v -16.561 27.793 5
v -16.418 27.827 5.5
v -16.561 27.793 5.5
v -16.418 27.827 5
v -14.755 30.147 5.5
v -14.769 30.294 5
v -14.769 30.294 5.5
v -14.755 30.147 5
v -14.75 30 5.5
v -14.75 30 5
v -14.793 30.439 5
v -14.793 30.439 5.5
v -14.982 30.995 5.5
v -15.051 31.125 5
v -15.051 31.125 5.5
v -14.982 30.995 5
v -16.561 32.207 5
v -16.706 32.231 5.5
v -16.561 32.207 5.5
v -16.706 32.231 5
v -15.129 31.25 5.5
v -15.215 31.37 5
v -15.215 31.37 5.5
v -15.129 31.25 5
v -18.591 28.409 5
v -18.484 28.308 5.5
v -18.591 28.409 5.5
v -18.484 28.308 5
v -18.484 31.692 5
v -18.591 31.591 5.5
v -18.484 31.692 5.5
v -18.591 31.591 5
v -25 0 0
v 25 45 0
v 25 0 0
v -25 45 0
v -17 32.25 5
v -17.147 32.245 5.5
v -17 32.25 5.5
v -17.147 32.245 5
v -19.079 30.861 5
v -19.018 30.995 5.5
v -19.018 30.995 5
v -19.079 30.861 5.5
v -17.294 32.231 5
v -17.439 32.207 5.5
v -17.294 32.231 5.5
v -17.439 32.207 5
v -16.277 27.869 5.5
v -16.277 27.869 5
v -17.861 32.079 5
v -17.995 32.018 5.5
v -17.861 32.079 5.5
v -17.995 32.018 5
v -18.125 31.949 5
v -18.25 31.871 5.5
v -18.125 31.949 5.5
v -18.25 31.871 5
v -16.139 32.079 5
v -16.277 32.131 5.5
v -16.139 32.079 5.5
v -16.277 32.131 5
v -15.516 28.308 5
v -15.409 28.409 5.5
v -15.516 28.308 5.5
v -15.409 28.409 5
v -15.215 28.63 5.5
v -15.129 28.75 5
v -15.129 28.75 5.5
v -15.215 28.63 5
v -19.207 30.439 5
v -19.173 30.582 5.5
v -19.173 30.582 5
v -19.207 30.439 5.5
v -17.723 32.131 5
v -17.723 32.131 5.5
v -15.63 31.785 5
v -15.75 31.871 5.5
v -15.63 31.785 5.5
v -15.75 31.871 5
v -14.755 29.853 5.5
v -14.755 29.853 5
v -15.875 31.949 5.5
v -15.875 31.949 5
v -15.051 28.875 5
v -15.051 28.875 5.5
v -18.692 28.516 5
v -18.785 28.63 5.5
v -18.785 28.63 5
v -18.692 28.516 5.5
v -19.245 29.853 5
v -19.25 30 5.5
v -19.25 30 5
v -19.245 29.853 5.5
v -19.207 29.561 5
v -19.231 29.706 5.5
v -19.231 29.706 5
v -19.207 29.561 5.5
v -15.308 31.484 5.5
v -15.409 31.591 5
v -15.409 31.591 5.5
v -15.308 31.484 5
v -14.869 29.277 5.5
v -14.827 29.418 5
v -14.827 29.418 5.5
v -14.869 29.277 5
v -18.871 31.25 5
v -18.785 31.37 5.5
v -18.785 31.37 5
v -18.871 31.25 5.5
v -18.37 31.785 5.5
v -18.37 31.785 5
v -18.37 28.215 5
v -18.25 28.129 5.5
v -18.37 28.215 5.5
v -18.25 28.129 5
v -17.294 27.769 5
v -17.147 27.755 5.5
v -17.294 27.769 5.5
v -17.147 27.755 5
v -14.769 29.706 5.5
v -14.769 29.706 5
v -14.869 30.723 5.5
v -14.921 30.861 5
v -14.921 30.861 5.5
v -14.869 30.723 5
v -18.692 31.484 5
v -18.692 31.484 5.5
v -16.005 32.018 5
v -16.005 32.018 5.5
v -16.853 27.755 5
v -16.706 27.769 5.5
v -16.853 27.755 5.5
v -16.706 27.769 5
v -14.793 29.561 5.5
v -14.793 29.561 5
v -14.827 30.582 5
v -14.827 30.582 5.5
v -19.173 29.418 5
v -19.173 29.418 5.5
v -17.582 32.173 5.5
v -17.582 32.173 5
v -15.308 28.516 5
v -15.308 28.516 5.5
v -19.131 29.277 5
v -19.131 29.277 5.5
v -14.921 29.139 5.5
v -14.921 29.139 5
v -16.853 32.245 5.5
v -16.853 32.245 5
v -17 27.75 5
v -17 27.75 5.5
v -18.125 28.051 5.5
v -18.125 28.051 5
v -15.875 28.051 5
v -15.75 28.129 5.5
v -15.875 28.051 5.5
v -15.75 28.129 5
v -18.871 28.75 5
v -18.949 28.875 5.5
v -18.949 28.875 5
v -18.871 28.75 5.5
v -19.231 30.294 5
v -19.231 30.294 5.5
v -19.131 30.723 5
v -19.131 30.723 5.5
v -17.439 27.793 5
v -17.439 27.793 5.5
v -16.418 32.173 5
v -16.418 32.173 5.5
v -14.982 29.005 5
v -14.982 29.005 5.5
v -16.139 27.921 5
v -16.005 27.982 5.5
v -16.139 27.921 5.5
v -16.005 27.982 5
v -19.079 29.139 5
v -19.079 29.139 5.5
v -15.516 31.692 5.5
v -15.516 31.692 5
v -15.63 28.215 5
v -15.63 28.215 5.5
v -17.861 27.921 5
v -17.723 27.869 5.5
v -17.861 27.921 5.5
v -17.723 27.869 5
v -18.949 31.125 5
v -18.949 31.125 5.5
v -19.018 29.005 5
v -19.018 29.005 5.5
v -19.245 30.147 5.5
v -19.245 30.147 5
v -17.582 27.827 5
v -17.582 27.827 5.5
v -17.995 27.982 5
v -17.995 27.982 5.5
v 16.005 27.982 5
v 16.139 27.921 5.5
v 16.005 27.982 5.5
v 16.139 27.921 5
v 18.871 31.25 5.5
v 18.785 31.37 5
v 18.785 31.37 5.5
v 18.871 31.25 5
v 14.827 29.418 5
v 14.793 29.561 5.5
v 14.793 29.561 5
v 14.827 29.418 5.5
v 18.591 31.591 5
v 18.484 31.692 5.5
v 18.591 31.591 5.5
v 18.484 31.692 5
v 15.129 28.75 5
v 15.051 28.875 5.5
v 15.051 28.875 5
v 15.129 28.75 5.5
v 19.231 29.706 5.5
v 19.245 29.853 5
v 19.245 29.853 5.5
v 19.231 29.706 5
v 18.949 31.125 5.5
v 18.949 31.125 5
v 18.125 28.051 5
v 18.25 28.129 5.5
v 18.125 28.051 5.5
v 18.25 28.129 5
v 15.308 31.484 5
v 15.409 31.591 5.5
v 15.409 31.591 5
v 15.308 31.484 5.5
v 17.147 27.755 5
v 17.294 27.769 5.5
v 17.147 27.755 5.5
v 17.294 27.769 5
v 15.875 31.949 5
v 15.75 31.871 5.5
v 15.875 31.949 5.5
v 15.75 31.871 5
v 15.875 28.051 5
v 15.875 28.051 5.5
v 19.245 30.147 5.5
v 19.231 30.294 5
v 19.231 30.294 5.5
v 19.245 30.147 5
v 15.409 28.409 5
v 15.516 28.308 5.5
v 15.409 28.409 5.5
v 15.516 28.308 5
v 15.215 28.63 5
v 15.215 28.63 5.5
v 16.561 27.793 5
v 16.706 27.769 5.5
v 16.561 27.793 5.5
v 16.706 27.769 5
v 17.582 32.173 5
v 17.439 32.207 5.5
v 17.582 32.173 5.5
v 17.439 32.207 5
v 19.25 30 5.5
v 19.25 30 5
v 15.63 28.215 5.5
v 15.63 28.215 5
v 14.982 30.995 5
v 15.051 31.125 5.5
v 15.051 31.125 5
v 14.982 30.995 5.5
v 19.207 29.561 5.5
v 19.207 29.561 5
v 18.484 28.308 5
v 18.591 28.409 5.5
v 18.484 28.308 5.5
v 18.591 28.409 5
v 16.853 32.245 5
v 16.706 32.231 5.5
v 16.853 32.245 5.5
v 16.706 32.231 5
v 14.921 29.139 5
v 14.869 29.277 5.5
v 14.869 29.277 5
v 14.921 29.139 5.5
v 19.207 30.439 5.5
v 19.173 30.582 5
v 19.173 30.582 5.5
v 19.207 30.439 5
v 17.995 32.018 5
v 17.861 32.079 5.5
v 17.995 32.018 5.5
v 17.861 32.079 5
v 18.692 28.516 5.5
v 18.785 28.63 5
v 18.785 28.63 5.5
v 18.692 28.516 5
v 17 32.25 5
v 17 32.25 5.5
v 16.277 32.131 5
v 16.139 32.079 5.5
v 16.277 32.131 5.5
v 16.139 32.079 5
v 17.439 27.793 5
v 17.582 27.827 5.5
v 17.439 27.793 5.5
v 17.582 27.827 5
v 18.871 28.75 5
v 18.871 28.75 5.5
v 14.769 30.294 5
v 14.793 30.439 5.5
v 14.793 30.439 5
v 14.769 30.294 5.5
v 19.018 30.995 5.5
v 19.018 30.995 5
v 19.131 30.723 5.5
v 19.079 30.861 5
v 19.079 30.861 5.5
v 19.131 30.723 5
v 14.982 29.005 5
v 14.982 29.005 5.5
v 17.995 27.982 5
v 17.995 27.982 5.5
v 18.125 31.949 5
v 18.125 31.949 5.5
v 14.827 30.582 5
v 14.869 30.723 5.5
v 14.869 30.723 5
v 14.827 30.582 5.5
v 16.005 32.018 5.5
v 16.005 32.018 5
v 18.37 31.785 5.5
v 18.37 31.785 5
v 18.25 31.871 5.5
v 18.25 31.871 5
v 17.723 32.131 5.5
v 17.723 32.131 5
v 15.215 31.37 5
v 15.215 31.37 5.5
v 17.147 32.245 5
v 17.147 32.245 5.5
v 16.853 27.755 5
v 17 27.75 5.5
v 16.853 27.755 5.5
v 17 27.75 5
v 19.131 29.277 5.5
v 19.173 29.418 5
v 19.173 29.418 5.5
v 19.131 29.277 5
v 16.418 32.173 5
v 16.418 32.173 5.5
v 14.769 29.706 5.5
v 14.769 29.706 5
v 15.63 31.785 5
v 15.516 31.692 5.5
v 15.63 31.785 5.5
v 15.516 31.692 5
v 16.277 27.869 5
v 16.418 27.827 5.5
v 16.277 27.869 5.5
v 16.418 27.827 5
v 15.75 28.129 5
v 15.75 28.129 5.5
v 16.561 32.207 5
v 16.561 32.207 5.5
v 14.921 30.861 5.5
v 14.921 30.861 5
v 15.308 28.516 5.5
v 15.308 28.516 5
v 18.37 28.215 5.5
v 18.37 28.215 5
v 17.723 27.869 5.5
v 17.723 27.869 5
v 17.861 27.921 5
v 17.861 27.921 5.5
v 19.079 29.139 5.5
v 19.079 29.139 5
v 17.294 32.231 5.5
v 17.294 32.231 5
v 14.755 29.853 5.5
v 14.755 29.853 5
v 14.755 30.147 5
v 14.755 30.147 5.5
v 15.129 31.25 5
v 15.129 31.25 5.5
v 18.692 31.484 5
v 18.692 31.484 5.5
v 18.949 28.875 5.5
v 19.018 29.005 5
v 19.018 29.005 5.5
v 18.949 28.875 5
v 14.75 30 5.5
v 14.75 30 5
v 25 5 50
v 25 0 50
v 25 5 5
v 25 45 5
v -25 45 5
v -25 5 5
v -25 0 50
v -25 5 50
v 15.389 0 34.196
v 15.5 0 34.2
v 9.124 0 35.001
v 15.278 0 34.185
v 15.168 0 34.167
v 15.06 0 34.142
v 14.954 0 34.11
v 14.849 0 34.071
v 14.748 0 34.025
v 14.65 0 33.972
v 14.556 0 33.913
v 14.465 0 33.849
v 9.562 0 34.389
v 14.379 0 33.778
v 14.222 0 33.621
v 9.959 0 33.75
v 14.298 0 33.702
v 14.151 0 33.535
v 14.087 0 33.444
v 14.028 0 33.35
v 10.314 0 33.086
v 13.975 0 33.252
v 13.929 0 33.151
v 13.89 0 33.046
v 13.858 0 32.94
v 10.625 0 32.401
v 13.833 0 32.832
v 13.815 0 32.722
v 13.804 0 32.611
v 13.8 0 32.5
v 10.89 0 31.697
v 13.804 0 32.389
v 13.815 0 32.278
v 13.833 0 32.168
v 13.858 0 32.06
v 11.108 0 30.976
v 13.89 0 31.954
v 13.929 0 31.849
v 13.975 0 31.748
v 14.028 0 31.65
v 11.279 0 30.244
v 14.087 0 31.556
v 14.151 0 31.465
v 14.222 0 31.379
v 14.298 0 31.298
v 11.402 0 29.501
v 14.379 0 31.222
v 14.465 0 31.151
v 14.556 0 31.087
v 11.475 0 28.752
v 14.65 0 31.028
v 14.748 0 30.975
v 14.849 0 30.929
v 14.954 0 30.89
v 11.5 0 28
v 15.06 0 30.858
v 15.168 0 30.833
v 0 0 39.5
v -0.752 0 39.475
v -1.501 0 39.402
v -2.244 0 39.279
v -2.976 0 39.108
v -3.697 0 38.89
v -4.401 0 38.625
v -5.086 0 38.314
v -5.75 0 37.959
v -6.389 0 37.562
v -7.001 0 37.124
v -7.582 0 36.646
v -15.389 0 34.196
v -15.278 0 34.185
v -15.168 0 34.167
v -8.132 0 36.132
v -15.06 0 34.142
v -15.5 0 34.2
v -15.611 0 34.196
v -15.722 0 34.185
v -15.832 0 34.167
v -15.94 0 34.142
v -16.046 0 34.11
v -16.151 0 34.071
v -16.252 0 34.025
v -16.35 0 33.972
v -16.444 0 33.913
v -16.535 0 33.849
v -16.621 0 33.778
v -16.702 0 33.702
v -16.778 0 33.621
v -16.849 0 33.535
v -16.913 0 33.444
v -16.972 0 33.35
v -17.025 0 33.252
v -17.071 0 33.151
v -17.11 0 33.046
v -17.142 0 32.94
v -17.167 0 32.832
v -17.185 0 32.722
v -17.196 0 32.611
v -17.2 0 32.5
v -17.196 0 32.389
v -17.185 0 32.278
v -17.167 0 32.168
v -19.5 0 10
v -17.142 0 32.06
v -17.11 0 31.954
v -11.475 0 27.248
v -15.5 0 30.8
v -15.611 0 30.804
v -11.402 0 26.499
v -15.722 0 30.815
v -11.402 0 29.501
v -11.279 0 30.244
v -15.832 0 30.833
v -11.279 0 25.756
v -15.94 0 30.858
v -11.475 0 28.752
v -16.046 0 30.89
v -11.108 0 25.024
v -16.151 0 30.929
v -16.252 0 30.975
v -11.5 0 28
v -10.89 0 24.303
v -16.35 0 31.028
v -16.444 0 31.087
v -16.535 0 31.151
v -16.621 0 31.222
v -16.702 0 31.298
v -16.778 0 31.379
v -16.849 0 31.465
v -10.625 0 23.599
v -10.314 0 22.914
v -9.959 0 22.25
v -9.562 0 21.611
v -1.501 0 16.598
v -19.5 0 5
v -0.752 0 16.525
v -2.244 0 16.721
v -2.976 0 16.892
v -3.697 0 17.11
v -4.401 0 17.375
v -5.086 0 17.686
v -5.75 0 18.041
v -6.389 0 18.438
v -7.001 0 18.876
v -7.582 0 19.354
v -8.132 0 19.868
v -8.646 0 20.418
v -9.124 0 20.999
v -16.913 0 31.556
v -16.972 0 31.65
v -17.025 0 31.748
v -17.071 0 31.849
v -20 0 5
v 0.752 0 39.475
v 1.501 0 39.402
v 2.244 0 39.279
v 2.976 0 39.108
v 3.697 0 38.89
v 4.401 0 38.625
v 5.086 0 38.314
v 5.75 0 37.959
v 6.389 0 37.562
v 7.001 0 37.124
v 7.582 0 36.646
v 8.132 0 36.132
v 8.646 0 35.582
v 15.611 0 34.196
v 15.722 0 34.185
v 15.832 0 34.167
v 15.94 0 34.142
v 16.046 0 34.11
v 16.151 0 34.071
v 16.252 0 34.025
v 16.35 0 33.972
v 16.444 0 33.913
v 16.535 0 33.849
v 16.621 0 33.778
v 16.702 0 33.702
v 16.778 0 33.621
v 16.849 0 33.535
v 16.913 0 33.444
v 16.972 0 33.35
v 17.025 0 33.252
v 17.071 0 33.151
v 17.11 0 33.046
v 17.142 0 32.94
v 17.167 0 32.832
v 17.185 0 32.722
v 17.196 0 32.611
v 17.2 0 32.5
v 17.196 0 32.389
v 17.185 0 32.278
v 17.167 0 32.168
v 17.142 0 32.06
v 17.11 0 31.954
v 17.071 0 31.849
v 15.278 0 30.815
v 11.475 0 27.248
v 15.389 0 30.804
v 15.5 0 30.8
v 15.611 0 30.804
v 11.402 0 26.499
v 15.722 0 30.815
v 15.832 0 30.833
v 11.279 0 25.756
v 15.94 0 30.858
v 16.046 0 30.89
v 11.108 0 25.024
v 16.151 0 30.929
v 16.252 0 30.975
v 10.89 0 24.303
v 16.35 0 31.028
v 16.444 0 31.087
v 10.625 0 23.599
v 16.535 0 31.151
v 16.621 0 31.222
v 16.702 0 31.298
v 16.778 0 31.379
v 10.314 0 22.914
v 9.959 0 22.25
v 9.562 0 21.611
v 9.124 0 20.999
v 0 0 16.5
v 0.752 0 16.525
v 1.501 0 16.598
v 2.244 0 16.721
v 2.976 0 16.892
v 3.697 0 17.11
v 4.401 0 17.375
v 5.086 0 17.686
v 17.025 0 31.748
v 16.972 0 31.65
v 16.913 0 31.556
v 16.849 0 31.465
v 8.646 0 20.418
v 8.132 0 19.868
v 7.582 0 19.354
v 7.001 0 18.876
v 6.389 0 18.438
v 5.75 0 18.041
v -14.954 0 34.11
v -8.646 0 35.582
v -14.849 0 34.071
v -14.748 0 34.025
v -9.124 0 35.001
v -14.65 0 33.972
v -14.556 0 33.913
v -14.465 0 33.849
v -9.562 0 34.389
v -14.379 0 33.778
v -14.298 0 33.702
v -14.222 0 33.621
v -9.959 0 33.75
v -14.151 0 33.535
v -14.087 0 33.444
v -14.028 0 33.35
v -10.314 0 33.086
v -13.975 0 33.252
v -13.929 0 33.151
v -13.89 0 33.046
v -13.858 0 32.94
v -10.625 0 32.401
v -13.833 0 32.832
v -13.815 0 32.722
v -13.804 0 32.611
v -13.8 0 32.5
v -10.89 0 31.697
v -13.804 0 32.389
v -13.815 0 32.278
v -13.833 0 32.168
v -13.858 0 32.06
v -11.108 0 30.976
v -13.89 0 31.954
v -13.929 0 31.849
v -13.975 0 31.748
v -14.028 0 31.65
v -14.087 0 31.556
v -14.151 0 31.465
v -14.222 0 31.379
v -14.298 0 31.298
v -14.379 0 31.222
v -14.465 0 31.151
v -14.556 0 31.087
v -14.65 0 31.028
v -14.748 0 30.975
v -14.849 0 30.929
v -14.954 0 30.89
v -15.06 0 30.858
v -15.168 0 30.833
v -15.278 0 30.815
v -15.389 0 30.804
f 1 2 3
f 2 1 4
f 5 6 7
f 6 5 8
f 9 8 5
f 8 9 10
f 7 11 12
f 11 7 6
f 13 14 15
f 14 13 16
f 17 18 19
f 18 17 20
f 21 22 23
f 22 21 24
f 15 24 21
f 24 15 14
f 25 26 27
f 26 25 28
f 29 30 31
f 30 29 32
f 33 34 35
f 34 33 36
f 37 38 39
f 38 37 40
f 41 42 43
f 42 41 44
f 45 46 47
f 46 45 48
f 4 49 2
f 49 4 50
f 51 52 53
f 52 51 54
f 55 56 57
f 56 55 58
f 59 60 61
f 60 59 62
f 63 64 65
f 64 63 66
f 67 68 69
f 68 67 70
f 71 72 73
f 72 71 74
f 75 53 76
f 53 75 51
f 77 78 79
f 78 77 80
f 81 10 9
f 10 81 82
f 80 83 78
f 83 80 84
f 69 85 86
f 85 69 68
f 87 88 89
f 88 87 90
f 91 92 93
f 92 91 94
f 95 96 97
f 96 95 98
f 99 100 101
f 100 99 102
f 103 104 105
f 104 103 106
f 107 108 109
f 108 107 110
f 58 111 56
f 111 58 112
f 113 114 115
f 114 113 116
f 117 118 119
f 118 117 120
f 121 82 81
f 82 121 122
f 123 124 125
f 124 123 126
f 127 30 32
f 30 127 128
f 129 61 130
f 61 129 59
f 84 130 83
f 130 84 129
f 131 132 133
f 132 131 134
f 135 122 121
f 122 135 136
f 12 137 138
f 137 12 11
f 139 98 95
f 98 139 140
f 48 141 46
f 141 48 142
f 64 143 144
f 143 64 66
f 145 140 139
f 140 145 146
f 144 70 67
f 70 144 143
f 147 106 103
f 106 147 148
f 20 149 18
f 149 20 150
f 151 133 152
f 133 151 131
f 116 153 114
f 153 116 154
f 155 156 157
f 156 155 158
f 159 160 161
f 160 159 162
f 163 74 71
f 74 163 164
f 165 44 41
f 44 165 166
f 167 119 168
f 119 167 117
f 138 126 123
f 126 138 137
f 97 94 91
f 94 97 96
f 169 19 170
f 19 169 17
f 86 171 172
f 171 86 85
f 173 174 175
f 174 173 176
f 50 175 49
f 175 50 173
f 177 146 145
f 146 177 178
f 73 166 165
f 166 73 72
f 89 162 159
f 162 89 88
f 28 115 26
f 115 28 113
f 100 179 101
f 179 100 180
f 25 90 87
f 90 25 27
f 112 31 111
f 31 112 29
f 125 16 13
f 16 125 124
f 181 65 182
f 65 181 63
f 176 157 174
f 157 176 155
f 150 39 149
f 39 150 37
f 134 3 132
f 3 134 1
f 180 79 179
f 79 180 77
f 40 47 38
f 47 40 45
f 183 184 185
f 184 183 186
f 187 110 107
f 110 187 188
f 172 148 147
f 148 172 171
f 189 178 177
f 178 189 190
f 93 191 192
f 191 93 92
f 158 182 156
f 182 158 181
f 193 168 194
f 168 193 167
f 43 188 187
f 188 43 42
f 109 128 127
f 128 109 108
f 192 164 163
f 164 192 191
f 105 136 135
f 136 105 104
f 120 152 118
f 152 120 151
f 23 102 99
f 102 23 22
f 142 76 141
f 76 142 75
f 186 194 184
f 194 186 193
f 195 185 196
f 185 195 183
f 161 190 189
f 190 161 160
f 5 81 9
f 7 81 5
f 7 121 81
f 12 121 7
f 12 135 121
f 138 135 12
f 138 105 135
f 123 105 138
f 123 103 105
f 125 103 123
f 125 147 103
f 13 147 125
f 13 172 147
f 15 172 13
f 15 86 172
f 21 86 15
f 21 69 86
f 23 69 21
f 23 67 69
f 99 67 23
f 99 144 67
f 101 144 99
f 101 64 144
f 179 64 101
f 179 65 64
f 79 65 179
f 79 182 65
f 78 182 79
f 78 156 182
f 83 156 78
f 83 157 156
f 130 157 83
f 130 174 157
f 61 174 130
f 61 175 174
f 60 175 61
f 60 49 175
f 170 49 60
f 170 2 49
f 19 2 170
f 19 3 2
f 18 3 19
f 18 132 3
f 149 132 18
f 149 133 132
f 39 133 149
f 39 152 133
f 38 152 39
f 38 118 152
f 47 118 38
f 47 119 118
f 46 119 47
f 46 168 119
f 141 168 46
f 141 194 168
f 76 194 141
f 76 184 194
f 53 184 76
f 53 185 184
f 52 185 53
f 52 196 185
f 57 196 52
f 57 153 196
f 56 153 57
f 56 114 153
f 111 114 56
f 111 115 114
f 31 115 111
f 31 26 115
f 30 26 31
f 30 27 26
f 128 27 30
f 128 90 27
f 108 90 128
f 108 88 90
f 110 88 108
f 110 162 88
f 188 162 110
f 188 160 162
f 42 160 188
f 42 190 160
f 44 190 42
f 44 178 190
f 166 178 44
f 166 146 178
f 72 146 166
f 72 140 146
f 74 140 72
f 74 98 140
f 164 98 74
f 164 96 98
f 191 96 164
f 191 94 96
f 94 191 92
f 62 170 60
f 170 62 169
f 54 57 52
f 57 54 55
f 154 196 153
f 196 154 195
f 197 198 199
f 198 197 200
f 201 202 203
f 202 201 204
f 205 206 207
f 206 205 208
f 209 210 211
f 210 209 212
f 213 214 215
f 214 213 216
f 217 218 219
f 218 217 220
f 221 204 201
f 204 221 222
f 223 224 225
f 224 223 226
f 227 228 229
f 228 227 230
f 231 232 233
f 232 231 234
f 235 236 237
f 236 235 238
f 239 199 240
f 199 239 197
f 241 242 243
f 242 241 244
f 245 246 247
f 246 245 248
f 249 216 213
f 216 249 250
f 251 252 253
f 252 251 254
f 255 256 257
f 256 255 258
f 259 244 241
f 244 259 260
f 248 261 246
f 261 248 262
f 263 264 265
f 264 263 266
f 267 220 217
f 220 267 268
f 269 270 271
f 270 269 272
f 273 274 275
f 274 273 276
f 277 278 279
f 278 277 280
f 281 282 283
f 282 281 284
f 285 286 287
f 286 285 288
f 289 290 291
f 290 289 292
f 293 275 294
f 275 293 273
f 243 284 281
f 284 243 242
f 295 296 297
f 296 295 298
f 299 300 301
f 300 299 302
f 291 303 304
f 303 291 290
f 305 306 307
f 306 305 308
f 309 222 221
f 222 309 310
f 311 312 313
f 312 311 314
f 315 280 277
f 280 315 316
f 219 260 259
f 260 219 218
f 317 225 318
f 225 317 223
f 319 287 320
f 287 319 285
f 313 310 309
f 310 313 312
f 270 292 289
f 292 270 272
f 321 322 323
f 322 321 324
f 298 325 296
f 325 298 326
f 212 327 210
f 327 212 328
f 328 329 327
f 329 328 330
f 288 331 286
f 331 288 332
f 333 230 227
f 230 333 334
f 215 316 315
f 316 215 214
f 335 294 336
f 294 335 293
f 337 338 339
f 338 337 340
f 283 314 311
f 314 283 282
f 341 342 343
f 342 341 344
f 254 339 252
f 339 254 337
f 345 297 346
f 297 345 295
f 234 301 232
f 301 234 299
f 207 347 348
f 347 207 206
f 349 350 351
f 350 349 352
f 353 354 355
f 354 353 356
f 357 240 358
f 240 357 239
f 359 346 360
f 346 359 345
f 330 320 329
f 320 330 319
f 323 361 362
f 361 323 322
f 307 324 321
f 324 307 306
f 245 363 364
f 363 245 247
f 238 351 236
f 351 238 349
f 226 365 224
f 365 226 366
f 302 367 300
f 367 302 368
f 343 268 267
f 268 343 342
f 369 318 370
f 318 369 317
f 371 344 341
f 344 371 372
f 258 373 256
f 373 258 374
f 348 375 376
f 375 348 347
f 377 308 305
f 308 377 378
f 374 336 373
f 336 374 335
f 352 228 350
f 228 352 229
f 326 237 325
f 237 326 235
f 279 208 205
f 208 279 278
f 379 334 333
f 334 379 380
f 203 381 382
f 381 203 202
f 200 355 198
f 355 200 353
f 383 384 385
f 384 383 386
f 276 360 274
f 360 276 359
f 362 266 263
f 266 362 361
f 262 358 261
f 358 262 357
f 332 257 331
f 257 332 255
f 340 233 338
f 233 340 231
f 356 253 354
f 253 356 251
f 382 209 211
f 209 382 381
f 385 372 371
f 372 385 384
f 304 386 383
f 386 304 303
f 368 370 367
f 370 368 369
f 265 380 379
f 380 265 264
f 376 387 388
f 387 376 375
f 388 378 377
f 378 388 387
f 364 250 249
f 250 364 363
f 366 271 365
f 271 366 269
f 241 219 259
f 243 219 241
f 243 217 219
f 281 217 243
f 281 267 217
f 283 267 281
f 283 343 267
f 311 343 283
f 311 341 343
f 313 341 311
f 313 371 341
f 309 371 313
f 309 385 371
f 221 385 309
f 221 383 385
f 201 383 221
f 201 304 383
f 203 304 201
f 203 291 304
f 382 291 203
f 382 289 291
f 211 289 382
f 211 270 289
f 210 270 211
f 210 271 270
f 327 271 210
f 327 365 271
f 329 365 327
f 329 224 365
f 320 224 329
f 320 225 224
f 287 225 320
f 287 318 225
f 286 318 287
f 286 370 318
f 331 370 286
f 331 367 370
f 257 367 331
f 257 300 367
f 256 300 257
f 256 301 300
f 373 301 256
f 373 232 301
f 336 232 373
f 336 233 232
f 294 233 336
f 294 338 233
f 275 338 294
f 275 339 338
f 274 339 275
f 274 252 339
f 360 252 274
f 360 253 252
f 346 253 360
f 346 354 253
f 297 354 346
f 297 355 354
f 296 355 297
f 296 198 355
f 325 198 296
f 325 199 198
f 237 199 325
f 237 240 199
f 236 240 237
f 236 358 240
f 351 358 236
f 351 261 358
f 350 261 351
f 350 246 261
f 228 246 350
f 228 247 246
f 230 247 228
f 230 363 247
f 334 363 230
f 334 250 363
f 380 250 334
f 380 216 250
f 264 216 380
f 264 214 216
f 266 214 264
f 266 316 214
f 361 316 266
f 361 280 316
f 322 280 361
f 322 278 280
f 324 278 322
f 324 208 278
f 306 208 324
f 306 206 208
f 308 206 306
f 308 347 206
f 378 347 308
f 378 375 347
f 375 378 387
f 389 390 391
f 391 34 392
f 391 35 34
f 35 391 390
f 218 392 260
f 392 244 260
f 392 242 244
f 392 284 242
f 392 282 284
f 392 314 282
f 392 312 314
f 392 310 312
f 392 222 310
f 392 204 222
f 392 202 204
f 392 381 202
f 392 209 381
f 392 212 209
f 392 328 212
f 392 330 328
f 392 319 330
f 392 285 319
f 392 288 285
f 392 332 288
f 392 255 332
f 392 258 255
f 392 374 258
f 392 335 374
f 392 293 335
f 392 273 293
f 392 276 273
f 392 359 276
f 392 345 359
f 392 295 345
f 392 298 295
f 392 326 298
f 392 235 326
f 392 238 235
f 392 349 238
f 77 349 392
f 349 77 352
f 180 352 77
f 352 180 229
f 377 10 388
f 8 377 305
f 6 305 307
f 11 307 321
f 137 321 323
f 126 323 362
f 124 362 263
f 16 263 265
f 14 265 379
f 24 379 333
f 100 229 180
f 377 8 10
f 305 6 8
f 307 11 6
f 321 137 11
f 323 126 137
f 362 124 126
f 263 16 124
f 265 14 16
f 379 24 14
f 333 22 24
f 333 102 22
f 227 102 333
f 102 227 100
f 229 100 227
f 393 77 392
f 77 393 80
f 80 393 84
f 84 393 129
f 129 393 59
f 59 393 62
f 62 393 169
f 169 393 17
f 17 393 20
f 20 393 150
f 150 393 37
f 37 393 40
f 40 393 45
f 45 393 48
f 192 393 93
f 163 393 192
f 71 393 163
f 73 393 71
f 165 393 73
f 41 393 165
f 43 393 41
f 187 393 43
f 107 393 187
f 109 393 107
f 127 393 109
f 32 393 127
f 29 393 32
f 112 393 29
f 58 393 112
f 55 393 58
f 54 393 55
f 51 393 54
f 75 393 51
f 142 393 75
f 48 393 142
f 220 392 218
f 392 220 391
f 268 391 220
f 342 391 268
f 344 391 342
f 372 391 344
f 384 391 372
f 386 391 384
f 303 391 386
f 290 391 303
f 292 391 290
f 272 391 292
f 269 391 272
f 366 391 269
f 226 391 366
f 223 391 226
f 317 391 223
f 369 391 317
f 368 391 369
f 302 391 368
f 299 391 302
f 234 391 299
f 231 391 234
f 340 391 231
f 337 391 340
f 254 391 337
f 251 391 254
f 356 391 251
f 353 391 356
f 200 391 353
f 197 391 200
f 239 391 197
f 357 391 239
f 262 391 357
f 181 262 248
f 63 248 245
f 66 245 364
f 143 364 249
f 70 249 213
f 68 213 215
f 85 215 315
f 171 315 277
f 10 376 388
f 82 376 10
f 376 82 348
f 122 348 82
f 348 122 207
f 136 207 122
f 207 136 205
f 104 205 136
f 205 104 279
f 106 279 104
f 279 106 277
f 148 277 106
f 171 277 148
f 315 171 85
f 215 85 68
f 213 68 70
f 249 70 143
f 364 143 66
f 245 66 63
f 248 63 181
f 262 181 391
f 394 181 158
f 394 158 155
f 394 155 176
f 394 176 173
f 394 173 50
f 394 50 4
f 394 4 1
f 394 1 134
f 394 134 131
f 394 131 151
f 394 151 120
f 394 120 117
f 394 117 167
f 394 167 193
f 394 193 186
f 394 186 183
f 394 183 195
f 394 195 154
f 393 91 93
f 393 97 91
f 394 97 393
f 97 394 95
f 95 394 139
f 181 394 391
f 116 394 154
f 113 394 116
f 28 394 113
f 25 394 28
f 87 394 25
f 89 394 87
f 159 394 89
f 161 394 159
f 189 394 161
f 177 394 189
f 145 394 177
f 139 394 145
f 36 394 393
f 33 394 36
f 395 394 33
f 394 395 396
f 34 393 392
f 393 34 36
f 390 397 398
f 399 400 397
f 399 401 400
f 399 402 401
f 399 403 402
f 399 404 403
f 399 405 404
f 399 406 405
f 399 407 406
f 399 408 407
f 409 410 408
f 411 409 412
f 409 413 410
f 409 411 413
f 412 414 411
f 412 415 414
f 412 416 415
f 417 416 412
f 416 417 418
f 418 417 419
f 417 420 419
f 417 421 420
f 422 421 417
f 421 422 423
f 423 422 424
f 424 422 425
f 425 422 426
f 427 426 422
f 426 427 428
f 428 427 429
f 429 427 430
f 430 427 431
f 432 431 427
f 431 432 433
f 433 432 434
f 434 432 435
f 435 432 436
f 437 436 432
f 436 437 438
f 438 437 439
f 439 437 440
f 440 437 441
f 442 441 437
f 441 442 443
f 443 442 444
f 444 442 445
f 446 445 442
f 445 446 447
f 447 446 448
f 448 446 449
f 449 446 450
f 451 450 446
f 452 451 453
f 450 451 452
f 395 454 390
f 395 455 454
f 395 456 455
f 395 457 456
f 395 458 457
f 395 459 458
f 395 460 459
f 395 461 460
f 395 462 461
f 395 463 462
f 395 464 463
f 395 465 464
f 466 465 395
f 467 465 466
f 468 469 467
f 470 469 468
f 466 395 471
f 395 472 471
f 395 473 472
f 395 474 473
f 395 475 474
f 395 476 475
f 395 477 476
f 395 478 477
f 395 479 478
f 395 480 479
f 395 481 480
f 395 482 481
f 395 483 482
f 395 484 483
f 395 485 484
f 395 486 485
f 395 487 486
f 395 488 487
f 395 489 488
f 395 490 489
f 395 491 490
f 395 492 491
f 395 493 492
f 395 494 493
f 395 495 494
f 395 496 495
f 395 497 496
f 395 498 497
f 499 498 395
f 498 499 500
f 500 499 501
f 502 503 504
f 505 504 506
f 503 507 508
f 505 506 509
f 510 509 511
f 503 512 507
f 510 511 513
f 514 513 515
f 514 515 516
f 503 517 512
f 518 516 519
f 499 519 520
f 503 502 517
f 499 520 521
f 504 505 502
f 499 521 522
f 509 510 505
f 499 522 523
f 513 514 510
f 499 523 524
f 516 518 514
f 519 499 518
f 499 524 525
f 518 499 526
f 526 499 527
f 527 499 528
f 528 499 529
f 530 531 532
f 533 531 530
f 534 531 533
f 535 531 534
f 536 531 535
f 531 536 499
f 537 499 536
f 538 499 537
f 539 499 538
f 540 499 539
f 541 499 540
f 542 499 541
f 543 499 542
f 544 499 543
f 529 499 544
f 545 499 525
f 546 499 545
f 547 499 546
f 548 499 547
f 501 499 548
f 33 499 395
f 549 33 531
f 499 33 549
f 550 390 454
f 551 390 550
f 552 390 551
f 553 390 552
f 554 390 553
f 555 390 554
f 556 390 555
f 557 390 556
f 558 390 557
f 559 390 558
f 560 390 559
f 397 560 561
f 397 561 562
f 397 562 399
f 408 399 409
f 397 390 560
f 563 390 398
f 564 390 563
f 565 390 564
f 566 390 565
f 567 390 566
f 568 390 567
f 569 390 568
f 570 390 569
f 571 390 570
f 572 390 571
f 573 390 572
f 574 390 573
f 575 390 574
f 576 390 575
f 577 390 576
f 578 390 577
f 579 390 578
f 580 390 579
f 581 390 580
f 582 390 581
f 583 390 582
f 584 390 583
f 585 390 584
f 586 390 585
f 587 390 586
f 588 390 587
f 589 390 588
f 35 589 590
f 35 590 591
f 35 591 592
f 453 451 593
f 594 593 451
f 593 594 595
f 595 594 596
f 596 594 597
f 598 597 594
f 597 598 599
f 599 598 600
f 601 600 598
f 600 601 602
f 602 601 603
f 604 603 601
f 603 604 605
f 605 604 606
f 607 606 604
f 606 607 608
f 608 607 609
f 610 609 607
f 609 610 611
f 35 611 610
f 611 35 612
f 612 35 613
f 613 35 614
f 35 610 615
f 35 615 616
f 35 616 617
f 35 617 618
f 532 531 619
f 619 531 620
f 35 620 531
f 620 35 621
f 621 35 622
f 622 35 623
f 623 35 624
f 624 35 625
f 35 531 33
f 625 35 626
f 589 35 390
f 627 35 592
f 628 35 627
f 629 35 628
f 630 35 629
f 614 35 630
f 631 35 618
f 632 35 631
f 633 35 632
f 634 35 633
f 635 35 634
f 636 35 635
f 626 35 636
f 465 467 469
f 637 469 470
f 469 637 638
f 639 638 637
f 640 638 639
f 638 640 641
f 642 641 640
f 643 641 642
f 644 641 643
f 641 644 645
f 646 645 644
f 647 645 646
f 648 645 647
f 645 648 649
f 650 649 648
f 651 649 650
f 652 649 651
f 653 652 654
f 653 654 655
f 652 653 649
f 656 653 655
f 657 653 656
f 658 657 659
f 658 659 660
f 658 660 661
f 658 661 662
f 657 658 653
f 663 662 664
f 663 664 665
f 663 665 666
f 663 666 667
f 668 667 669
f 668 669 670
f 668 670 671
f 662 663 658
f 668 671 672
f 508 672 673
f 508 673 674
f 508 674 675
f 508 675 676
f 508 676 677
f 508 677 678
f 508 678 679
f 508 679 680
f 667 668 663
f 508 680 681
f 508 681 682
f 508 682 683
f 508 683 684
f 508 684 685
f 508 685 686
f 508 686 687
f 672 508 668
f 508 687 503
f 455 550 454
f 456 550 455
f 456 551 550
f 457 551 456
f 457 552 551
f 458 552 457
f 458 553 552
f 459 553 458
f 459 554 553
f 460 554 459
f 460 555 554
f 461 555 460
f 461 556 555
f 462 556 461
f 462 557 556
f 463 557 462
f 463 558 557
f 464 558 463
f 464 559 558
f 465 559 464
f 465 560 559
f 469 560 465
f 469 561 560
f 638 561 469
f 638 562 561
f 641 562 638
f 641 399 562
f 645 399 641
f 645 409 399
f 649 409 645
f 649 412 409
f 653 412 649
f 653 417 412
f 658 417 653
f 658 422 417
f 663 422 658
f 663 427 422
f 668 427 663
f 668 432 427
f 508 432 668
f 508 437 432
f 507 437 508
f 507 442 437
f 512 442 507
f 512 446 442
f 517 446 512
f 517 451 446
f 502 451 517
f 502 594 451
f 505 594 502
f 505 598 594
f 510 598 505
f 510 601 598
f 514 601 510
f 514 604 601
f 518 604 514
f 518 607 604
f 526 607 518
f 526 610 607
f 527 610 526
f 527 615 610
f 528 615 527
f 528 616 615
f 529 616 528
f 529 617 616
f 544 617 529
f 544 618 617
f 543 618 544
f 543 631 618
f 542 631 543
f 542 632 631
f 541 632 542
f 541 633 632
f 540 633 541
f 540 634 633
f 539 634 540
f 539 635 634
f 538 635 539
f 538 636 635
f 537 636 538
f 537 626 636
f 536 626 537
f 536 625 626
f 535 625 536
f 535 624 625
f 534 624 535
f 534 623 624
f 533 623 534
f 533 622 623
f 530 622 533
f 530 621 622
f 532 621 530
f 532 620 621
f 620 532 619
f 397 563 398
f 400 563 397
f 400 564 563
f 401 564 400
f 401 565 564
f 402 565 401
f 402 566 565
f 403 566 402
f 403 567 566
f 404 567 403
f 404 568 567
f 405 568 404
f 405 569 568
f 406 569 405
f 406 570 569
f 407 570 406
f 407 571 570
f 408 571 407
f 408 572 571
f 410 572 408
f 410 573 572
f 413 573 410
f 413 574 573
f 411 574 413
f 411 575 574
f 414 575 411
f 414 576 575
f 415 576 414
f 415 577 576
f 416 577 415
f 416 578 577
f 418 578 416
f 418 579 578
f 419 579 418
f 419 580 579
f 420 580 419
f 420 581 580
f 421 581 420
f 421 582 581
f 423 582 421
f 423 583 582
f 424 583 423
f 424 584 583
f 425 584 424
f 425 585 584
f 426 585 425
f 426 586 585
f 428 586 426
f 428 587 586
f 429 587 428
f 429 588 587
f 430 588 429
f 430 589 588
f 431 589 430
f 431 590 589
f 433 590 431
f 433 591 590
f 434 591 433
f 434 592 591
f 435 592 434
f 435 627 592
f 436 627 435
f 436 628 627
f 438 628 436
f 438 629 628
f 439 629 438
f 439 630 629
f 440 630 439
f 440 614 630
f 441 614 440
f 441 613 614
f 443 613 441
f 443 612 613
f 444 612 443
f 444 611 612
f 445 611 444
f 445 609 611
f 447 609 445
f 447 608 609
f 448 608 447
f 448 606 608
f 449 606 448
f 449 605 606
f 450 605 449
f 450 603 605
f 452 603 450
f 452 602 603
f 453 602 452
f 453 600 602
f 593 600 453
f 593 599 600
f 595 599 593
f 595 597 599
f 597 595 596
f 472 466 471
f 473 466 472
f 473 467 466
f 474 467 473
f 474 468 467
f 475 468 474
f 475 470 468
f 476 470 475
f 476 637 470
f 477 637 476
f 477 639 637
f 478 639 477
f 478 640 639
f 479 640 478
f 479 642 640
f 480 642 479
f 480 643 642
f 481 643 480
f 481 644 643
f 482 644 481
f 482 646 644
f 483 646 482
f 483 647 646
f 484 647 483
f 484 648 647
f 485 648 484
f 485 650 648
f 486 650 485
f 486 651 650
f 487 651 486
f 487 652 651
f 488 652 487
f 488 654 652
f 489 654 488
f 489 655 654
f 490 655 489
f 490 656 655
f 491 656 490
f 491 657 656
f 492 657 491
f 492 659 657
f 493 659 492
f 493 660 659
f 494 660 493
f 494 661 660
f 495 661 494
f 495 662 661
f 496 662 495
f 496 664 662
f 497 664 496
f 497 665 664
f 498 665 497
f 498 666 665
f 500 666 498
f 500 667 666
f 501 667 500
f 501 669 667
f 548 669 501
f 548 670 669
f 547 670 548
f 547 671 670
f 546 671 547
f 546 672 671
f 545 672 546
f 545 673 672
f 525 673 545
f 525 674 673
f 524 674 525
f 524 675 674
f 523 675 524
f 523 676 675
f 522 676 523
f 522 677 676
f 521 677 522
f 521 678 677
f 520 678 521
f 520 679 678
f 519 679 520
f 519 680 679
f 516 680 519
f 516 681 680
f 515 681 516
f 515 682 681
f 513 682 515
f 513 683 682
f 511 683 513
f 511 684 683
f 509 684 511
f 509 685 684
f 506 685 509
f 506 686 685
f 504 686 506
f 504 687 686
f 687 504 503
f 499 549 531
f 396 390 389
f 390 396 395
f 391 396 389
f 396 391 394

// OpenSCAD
// L-shaped mounting bracket for NEMA 17 stepper motor
// Print orientation: base plate on bed, vertical plate builds up in +Z

// ---- Base plate ----
base_x = 25;       // plate spans x = -25 to 25
base_y = 45;       // plate spans y = 0 to 45
base_z = 5;        // plate thickness

// ---- Motor plate ----
motor_x = 25;      // plate spans x = -25 to 25
motor_y = 5;       // plate spans y = 0 to 5
motor_z = 50;      // plate height (z = 0 to 50)

// ---- Boss hole ----
boss_d = 23;       // motor centring boss hole diameter
boss_x = 0;        // hole centre x
boss_z = 28;       // hole centre z

// ---- Screw holes ----
screw_d = 3.4;     // M3 screw hole diameter
screw_p = 31;      // square pattern side length
screw_h = 4.5;     // screw hole depth

// ---- Gussets ----
gusset_t = 5;      // gusset thickness (along X)
gusset_y = 5;      // gusset leg length along Y
gusset_z = 5;      // gusset leg length along Z
gusset_x = -20;    // left gusset spans x = -25 to -20

// ---- Misc ----
eps = 0.5;         // cutter overshoot past faces
$fn = 96;          // curve resolution

difference() {
    union() {
        // Base plate with M4 through-holes
        translate([-base_x, 0, 0])
            cube([base_x - (-base_x), base_y, base_z]);
        for (sx = [-17, 17])
            translate([sx, 30, 0])
                cylinder(d = 4.5, h = base_z + eps);

        // Vertical motor plate
        translate([-motor_x, 0, 0])
            cube([motor_x - (-motor_x), motor_y, motor_z]);
    }

    // Boss hole cut along Y
    translate([boss_x, 0, boss_z])
        rotate([90, 0, 0])
            cylinder(d = boss_d, h = motor_y + 2 * eps);

    // M3 screw holes on square pattern centred on boss hole
    for (i = [0 : 3]) {
        r = screw_p / 2;
        a = i * 90;
        translate([boss_x + r * cos(a), 0, boss_z + screw_h])
            rotate([90, 0, 0])
                cylinder(d = screw_d, h = motor_y + eps);
    }

    // Gussets flush with left and right edges
    for (sx = [-25, 25])
        translate([sx, 0, 0])
            rotate([90, 0, 0])
                linear_extrude(height = gusset_t)
                    polygon(points = [
                        [gusset_y, gusset_z],
                        [gusset_y + eps, gusset_z],
                        [gusset_y + eps, gusset_z + gusset_z]
                    ]);
}
